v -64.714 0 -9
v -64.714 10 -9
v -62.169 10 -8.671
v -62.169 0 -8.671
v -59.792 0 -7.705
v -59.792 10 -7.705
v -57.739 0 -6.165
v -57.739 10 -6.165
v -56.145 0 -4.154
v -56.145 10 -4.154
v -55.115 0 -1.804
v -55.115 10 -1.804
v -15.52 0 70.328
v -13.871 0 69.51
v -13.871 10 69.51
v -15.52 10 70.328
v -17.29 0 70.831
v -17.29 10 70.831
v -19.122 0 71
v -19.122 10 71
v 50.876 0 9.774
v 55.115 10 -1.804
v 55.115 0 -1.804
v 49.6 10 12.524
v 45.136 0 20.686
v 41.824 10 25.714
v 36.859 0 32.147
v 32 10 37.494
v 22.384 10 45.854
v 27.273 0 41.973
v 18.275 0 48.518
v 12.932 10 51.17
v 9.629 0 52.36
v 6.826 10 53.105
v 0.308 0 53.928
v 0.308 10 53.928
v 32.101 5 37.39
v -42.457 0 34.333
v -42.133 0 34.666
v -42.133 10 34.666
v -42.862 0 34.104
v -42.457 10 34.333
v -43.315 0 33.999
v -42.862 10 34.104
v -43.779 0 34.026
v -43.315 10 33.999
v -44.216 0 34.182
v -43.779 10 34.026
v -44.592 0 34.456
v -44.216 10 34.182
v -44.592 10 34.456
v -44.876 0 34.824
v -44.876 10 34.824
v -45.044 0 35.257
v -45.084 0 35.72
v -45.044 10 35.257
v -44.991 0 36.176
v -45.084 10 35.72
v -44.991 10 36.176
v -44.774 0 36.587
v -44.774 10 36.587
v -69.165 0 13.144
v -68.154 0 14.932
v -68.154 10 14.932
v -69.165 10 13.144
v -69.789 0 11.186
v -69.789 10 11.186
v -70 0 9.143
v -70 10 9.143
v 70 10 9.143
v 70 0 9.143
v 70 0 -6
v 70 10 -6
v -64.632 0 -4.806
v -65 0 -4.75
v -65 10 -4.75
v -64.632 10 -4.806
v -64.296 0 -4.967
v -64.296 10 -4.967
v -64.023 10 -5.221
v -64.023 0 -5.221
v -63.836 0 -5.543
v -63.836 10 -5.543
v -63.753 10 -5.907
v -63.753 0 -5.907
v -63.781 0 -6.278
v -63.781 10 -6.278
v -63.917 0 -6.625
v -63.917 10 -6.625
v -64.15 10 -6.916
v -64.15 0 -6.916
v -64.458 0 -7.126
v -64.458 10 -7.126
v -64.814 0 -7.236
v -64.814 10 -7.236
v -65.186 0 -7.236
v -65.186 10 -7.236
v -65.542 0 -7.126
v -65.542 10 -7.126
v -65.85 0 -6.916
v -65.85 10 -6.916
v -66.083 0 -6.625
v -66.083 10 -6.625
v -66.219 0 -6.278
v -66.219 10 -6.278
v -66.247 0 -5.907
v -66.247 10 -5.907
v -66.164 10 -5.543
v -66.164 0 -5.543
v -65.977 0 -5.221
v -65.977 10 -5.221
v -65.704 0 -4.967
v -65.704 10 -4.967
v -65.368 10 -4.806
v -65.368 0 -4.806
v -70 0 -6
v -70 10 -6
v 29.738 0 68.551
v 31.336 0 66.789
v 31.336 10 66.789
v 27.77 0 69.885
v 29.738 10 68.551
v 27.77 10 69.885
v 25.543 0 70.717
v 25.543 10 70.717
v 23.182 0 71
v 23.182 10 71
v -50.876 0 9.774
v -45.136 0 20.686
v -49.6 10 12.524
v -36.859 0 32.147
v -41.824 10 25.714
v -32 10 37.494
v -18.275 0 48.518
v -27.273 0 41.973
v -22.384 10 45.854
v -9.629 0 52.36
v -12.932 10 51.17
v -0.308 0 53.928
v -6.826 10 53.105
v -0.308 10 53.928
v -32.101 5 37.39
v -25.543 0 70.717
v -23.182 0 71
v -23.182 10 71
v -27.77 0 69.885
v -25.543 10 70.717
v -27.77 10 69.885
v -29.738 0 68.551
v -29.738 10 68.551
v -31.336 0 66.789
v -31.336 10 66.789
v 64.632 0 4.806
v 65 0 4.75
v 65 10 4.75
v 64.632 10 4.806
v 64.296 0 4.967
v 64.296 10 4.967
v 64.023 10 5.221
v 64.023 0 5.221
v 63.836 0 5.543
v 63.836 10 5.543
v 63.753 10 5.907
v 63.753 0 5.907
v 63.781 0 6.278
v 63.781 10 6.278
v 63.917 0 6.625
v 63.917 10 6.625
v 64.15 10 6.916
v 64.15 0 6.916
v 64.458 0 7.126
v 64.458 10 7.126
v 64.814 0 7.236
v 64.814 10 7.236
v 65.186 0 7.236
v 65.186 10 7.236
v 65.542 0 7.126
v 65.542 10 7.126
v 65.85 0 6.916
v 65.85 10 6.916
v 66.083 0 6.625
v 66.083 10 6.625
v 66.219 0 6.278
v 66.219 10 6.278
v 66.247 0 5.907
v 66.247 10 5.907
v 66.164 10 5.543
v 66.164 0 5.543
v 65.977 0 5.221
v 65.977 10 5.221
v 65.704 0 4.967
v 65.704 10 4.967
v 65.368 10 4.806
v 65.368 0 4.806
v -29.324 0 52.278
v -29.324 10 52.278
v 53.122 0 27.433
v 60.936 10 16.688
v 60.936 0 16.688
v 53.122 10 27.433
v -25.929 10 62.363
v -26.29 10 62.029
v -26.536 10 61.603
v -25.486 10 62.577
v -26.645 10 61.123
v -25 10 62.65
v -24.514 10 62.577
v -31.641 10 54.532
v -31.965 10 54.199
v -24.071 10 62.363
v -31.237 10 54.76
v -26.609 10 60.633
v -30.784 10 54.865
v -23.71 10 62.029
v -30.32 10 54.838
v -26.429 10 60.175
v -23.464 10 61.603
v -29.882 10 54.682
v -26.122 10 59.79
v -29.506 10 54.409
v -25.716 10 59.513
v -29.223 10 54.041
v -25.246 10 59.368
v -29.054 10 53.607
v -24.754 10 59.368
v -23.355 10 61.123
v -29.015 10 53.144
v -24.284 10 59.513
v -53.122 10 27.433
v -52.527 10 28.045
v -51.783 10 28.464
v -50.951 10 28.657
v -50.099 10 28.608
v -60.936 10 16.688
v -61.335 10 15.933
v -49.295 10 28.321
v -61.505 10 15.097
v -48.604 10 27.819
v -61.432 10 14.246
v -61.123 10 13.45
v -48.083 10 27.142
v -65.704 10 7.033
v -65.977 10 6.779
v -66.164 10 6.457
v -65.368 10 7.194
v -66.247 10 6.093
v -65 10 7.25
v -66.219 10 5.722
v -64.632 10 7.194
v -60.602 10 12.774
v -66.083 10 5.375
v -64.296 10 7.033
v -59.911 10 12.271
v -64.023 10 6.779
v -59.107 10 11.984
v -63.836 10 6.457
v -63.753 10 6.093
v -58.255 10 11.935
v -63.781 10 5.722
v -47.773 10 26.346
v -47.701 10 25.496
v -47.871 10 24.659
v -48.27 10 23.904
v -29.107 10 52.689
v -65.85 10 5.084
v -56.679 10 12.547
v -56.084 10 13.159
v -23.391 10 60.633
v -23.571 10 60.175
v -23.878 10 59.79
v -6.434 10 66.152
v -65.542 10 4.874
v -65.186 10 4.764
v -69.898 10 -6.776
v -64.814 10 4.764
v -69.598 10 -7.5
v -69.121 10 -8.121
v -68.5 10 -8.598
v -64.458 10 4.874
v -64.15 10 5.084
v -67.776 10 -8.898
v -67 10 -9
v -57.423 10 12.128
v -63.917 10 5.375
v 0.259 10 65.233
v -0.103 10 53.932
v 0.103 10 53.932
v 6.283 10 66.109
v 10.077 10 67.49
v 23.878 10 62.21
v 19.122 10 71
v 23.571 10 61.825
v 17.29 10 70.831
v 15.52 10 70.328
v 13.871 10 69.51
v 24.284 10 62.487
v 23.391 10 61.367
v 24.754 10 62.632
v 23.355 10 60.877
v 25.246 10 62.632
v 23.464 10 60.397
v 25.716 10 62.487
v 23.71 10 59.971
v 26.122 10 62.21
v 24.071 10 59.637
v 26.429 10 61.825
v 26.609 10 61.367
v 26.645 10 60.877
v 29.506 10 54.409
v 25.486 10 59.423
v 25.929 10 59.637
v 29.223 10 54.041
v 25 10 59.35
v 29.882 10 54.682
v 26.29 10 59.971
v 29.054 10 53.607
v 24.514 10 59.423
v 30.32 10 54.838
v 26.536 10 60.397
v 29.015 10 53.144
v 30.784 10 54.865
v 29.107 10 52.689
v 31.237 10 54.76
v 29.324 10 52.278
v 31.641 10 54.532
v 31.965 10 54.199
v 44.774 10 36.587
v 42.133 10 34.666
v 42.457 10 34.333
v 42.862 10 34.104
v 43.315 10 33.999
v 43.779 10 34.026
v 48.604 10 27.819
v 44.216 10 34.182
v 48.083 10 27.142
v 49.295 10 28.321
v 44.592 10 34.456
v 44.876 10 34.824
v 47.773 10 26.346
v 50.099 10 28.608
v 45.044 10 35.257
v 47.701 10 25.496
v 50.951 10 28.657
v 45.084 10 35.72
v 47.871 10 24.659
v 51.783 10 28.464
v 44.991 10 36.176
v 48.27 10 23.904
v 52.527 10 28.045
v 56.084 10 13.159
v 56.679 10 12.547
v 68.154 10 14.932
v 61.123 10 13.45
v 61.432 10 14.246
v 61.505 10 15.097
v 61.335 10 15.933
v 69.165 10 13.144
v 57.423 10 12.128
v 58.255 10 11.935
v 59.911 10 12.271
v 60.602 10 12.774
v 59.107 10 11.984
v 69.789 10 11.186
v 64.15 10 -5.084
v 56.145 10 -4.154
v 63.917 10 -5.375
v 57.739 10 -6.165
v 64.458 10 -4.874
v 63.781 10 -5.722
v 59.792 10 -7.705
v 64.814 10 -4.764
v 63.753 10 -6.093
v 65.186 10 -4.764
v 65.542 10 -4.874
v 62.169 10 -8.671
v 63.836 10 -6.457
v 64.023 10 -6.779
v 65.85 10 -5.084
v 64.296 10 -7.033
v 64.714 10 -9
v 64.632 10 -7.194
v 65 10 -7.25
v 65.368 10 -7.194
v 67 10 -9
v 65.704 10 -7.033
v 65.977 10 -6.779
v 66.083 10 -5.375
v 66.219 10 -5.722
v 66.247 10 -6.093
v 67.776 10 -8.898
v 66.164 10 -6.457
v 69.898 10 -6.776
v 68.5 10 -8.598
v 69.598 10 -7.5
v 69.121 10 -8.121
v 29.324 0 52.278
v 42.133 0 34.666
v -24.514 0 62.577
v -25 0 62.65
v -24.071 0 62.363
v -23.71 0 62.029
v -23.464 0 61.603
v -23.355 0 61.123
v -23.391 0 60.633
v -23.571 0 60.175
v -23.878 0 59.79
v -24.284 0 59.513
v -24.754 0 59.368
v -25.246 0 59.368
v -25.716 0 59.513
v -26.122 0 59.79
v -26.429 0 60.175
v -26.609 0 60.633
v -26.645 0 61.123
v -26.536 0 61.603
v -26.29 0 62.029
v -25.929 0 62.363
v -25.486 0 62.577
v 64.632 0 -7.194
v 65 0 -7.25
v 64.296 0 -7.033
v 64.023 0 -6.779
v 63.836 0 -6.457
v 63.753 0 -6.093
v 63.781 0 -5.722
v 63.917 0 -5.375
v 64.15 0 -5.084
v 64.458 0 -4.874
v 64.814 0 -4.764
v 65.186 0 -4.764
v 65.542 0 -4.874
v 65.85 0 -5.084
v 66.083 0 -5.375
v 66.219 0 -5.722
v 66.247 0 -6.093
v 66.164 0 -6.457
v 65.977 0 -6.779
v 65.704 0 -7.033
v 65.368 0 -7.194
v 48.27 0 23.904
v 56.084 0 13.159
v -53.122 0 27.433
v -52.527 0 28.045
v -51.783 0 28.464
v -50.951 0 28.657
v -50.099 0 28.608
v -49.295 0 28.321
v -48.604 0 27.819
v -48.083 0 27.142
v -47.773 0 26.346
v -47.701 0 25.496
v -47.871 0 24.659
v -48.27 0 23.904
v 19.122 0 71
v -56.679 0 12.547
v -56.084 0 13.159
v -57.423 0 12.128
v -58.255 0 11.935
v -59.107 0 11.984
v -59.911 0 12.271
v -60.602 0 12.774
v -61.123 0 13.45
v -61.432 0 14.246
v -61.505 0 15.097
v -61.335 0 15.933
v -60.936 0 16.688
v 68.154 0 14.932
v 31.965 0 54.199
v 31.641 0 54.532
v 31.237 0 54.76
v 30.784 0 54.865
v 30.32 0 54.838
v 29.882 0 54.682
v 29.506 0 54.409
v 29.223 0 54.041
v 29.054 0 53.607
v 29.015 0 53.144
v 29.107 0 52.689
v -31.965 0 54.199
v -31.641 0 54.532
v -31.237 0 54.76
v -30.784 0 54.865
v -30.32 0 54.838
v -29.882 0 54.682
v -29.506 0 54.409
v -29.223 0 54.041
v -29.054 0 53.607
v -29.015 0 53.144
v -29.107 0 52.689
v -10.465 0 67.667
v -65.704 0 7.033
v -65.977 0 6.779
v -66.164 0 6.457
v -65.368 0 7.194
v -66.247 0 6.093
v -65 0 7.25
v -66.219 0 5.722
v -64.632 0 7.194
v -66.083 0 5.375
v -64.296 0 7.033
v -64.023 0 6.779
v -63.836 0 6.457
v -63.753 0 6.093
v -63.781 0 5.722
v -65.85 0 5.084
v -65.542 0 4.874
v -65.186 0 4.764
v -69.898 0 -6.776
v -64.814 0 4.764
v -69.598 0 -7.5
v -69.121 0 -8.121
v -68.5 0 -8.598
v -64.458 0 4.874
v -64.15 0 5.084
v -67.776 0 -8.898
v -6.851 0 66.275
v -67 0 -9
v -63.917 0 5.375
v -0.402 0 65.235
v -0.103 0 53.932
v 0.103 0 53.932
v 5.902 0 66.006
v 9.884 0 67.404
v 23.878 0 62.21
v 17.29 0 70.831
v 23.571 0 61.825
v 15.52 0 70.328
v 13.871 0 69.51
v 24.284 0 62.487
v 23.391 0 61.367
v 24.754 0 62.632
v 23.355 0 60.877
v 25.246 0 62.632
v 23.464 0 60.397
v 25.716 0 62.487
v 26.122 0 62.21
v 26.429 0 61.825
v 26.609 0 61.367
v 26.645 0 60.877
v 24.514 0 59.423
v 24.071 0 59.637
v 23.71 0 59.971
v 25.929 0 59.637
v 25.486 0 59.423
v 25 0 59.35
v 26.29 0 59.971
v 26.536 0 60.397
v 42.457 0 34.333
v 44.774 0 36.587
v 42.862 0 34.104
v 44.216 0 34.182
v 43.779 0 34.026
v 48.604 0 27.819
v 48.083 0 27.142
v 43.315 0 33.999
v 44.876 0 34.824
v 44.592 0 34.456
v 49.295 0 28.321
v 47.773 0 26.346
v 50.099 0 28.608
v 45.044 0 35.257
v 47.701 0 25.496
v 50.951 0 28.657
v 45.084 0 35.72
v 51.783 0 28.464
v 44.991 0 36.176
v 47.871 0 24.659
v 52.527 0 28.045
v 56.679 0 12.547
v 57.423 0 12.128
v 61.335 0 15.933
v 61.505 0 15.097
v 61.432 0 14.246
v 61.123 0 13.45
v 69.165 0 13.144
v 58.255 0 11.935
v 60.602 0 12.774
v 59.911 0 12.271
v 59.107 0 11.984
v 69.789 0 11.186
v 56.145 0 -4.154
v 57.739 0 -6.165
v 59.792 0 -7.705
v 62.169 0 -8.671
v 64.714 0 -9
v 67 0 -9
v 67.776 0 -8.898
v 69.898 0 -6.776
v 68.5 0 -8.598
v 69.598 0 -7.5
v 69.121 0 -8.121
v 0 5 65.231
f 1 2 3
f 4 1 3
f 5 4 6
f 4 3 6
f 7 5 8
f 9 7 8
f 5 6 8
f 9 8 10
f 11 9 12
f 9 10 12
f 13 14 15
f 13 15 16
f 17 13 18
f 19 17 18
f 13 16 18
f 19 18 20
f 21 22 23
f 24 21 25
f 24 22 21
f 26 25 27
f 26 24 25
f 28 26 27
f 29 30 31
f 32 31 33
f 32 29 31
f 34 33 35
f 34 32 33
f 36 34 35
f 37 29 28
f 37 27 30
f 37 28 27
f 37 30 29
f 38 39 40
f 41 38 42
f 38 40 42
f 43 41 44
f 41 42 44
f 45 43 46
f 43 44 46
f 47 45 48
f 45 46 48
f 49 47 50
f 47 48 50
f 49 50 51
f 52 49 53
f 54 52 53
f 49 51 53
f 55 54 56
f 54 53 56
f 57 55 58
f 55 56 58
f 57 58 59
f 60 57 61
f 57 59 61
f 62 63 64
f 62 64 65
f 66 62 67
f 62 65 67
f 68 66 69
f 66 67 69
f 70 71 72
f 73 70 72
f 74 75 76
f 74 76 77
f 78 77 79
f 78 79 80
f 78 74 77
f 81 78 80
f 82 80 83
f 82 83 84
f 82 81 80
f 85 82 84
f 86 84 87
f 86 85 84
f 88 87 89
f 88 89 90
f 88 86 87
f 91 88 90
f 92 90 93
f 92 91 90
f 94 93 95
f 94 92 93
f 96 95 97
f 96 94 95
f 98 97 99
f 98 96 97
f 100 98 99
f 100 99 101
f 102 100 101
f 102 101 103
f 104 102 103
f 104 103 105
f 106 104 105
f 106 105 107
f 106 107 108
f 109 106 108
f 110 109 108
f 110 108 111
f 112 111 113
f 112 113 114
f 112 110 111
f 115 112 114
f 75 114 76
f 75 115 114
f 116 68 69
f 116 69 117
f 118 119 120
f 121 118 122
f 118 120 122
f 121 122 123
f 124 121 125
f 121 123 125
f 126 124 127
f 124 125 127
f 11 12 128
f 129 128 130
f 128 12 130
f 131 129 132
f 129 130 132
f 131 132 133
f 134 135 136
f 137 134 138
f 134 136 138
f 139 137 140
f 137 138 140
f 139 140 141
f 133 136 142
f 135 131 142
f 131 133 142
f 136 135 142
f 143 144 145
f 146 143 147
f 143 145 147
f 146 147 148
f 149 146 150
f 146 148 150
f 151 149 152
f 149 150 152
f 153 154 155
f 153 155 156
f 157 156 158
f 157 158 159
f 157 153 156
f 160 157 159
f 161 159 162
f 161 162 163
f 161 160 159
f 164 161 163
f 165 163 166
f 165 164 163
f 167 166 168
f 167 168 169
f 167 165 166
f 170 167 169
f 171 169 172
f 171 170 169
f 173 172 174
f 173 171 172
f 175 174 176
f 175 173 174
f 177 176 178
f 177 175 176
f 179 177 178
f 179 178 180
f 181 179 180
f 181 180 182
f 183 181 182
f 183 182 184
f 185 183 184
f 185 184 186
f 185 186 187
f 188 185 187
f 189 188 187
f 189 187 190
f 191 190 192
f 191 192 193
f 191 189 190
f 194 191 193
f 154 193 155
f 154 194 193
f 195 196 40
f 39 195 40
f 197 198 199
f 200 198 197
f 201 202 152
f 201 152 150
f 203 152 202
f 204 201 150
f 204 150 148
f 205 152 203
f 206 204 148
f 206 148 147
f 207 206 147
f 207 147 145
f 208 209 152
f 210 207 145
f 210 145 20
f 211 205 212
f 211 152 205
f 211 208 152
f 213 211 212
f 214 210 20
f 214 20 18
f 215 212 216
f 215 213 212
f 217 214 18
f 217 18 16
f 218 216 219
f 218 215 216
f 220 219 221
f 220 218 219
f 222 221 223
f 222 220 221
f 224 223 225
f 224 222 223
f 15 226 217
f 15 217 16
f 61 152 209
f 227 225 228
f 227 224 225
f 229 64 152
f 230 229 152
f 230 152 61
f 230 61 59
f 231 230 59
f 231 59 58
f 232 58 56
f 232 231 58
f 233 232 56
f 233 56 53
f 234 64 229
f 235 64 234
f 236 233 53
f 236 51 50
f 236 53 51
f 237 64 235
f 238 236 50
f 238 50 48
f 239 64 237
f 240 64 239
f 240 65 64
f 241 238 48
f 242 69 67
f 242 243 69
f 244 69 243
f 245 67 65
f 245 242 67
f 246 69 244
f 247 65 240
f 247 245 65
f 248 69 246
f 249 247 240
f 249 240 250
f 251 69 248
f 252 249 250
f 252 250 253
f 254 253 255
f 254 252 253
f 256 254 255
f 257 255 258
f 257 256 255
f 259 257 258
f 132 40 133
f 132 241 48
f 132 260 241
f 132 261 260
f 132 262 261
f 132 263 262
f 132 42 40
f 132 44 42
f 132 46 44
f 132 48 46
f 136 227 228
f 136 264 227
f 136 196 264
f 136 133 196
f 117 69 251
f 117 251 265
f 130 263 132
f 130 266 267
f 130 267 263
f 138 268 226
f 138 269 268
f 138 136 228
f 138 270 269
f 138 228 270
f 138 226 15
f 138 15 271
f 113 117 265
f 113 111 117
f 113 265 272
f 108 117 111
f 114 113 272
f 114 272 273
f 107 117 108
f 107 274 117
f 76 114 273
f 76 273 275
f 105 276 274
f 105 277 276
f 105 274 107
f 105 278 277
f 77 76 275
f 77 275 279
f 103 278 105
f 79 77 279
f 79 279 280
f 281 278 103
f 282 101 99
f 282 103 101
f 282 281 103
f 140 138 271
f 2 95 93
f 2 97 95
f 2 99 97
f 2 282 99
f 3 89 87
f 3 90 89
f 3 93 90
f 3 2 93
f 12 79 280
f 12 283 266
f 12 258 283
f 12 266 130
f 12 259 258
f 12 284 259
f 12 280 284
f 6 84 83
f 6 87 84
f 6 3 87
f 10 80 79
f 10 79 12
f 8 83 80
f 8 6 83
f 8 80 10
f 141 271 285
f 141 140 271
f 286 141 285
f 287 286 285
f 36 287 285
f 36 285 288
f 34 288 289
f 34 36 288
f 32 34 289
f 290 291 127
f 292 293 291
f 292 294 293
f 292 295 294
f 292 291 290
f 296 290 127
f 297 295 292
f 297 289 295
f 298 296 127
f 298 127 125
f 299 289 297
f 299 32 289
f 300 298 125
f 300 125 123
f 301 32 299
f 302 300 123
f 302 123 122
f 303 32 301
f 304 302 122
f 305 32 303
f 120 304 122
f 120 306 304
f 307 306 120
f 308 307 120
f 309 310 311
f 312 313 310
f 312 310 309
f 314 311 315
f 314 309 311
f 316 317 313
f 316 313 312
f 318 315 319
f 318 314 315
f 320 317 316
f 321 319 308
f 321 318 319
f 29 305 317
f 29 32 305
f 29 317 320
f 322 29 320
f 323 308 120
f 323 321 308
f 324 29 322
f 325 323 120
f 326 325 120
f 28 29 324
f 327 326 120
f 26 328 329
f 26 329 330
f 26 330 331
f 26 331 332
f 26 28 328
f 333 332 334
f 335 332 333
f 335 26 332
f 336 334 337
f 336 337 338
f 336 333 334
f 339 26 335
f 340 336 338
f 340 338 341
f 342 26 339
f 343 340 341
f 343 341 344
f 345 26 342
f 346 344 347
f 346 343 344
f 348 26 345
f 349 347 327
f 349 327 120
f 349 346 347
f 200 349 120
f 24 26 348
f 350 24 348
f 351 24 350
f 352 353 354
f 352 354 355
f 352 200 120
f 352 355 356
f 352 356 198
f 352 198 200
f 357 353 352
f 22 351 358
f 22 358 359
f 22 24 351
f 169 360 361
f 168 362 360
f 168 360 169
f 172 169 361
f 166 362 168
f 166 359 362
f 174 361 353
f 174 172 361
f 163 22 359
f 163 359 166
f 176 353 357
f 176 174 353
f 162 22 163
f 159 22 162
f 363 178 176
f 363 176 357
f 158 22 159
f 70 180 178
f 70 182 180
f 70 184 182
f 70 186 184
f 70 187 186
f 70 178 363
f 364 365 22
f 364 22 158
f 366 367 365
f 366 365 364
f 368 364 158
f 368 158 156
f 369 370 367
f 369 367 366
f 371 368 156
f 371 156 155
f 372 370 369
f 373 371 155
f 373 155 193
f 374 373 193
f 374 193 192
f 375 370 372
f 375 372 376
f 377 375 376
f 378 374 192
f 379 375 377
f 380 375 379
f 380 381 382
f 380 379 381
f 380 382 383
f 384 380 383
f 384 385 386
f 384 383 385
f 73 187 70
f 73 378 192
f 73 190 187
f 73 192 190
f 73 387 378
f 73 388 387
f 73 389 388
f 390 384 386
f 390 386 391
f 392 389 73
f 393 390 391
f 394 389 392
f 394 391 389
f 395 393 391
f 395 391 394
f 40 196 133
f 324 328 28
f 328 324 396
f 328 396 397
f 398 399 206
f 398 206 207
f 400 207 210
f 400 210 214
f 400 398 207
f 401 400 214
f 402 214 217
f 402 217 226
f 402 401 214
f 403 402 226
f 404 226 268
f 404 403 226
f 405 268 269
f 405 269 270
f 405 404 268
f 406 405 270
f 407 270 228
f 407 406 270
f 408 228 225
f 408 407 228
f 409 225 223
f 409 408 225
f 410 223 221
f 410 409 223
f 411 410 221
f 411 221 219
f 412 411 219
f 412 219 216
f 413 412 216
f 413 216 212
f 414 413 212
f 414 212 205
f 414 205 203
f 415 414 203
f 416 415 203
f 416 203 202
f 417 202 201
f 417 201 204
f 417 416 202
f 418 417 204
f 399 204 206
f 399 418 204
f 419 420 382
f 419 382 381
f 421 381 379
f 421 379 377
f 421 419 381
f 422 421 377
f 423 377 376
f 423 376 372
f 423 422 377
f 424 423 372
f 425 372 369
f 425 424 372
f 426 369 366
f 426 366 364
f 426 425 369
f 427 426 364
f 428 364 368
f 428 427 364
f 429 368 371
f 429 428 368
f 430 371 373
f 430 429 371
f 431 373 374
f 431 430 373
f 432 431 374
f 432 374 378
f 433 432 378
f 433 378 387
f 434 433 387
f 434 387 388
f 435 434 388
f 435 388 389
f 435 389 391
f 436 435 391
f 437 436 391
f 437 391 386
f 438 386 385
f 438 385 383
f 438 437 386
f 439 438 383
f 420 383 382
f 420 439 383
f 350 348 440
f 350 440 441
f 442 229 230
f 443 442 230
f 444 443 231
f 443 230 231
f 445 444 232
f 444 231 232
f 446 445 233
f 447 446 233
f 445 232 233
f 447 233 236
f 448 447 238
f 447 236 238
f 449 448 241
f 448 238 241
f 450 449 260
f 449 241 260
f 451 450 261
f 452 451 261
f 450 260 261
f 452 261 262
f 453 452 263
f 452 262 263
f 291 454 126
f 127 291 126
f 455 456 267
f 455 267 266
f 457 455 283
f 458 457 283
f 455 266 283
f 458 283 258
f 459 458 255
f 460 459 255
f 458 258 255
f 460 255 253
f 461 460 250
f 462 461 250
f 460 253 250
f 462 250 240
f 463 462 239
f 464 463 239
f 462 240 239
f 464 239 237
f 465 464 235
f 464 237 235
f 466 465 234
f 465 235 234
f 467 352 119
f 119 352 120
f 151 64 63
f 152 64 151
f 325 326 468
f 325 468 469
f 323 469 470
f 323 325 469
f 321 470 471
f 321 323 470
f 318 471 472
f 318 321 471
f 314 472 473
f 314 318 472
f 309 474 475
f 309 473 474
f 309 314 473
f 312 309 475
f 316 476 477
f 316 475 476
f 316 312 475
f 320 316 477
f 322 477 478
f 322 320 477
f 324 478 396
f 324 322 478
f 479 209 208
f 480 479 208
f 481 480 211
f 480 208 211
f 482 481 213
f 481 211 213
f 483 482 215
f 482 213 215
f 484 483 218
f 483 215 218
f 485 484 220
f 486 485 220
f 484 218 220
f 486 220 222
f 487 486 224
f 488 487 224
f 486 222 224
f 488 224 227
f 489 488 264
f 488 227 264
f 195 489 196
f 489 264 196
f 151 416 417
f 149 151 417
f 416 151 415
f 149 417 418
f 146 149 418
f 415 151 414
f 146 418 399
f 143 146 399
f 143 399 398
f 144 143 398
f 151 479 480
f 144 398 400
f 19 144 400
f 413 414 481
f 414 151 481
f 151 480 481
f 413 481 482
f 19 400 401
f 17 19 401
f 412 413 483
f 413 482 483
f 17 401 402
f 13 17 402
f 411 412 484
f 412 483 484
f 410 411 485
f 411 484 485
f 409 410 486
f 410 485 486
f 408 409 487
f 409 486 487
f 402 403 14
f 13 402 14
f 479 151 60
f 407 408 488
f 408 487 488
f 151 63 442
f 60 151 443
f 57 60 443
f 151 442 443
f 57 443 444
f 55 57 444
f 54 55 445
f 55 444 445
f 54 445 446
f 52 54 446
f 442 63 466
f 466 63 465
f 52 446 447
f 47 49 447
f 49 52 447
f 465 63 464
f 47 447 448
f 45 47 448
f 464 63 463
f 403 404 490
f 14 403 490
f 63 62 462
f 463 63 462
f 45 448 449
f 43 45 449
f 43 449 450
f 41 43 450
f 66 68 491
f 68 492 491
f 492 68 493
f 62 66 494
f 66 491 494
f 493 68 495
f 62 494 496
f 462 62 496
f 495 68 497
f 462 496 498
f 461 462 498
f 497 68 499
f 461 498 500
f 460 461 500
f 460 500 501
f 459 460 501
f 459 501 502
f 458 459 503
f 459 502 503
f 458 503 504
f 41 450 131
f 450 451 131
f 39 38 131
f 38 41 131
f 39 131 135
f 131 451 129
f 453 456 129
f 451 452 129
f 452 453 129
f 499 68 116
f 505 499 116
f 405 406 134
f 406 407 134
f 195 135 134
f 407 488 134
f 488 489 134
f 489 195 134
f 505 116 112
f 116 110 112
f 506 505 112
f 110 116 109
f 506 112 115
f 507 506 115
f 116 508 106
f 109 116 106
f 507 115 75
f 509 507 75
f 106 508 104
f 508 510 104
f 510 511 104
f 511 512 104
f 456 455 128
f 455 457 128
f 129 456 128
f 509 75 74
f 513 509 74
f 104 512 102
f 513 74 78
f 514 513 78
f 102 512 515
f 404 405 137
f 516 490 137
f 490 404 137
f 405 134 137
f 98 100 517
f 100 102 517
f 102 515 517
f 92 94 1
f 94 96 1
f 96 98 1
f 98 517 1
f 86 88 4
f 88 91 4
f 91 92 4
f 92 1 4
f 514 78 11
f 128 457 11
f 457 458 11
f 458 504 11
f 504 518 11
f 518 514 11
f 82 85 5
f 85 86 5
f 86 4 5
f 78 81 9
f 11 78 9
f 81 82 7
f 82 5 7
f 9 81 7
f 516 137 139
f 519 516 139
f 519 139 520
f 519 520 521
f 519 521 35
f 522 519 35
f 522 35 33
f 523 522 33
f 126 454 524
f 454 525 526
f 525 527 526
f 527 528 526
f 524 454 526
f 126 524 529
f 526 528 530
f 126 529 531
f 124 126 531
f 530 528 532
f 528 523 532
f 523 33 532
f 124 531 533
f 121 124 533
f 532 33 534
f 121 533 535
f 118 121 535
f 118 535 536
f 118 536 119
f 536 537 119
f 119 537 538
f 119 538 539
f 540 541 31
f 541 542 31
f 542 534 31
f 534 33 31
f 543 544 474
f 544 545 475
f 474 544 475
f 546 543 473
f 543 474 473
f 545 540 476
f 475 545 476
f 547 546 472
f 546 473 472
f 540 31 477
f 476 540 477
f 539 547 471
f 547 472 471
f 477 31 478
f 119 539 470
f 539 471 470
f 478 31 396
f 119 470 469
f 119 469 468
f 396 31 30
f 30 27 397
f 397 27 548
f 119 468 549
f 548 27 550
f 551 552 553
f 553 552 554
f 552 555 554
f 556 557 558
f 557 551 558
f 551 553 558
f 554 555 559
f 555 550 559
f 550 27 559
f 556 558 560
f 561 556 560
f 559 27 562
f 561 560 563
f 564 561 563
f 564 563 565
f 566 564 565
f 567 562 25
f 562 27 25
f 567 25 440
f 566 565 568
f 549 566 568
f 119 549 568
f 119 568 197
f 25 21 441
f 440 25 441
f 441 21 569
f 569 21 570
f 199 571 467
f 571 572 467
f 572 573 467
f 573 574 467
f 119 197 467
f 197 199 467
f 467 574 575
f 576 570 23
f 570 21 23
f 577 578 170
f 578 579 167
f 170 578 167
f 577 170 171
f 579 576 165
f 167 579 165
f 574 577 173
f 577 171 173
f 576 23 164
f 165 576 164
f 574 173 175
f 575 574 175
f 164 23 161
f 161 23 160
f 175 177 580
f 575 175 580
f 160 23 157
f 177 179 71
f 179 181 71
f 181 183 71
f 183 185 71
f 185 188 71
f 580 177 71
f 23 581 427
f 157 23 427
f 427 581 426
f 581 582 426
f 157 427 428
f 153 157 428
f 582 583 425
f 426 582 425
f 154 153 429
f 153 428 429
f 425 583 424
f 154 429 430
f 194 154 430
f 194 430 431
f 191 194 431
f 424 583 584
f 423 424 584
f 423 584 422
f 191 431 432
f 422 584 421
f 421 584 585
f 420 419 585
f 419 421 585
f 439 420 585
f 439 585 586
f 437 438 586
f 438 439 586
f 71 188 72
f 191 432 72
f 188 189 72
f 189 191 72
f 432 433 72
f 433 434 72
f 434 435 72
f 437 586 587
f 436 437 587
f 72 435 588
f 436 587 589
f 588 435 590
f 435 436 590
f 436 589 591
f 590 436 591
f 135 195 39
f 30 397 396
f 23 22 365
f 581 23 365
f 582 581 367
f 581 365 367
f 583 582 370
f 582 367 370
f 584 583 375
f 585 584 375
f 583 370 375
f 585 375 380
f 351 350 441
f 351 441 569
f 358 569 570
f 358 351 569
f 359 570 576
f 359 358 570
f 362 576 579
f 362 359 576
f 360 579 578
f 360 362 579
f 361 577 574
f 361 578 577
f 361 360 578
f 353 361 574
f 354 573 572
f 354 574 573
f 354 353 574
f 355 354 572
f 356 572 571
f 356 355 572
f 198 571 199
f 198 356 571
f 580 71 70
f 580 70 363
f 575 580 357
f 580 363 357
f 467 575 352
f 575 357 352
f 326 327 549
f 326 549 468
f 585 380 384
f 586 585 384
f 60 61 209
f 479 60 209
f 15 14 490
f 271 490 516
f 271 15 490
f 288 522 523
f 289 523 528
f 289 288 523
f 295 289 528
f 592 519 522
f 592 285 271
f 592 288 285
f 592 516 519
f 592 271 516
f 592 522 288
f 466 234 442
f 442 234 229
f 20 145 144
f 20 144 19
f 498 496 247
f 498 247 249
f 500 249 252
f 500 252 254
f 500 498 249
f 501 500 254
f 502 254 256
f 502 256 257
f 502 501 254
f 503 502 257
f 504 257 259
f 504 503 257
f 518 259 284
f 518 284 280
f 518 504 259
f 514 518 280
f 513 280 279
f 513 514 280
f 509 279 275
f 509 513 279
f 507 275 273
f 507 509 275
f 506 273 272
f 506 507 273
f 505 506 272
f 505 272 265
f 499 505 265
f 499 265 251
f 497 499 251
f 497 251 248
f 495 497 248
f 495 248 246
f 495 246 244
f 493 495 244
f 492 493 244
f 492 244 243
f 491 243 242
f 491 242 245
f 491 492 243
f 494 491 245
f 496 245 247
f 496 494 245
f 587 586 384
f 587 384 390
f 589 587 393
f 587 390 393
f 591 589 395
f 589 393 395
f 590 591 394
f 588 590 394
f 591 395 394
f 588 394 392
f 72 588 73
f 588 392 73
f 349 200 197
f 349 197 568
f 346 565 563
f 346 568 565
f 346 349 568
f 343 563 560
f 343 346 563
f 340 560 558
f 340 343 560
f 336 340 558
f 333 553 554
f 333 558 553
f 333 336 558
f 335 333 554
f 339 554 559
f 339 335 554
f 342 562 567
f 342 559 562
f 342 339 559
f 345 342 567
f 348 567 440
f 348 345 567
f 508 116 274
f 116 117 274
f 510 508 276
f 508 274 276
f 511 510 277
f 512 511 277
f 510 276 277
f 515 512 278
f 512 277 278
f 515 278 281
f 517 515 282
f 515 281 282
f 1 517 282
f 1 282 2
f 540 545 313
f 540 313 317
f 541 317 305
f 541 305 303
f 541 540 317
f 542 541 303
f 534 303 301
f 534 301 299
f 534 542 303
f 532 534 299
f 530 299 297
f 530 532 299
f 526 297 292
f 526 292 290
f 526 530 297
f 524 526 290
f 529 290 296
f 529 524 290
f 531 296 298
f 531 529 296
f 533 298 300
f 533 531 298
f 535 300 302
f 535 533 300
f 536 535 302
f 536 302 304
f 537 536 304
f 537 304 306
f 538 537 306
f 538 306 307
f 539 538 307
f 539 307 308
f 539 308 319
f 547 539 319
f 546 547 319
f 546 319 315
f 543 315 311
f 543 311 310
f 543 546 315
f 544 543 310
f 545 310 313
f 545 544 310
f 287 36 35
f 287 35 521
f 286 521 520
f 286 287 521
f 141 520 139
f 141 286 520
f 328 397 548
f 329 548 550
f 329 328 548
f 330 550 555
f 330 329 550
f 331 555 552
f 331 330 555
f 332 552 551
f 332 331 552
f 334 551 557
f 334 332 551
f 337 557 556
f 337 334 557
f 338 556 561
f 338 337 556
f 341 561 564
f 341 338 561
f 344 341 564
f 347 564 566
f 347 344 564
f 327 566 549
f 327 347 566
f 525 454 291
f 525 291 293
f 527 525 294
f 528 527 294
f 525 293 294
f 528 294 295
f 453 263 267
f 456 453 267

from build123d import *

# Parameters (mm, degrees)
SKETCH_1_W          = 140
SKETCH_1_H          = 80
SKETCH_1_R          = 1.25
SKETCH_1_R_2        = 1.65
EXTRUDE_1_DEPTH     = 10
CUT_EXTRUDE_1_DEPTH = 101.204790305
FILLET_1_R          = 10
FILLET_2_R          = 3
CUT_EXTRUDE_2_DEPTH = 101.204790455


with BuildPart() as part:
    # 草图1 → 凸台-拉伸1 (new body)
    with BuildSketch(Plane(origin=(0, 0, 0), x_dir=(1, 0, 0), z_dir=(0, 1, 0))):
        with Locations((0, -31)):
            Rectangle(SKETCH_1_W, SKETCH_1_H)
        with Locations(Location((-65, 6, 0), (0, 0, 270))):
            Circle(SKETCH_1_R, mode=Mode.SUBTRACT)
        with Locations(Location((-65, -6, 0), (0, 0, 270))):
            Circle(SKETCH_1_R, mode=Mode.SUBTRACT)
        with Locations(Location((65, -6, 0), (0, 0, 90))):
            Circle(SKETCH_1_R, mode=Mode.SUBTRACT)
        with Locations(Location((65, 6, 0), (0, 0, 90))):
            Circle(SKETCH_1_R, mode=Mode.SUBTRACT)
        with Locations(Location((-25, -61, 0), (0, 0, 270))):
            Circle(SKETCH_1_R_2, mode=Mode.SUBTRACT)
        with Locations(Location((25, -61, 0), (0, 0, 90))):
            Circle(SKETCH_1_R_2, mode=Mode.SUBTRACT)
    extrude(amount=EXTRUDE_1_DEPTH)

    # 草图2 → 切除-拉伸1 (cut, through all)
    with BuildSketch(Plane(origin=(0, 10, 0), x_dir=(1, 0, 0), z_dir=(0, 1, 0))):
        Polygon((-70, -12.331865366), (-28.346020761, -71), (-70, -71), align=None)
        Polygon((70, -12.331865366), (28.346020761, -71), (70, -71), align=None)
        with BuildLine():
            Line((-16.105693614, -71), (16.105693614, -71))
            add(Edge.make_bspline(
                [(-16.105693614, -71), (0, -59.46206609), (16.105693614, -71)],
                knots=[0, 0, 0, 1, 1, 1], degree=2))
        make_face()
        with BuildLine():
            Line((56.906784104, 9), (-56.906784104, 9))
            add(Edge.make_bspline(
                [(-56.906784104, 9), (-53.268076424, -8.599244087), (-38.630052836, -35.640481439), (-12.875691634, -53.653343186), (0, -53.936278292)],
                knots=[0, 0, 0, 0, 0.590583246, 1, 1, 1, 1], degree=3))
            add(Edge.make_bspline(
                [(56.906784104, 9), (53.268076424, -8.599244087), (38.630052836, -35.640481439), (12.875691634, -53.653343186), (0, -53.936278292)],
                knots=[0, 0, 0, 0, 0.590583246, 1, 1, 1, 1], degree=3))
        make_face()
    extrude(amount=-CUT_EXTRUDE_1_DEPTH, mode=Mode.SUBTRACT)

    # 圆角1
    # the kernel refuses this fillet: 10 mm, written as the material it adds along each edge
    with BuildSketch(Plane(origin=(0, 10, 53.936278292), x_dir=(-0.999651568741567, 0, -0.026395854078324985), z_dir=(0, -1, 0))) as fillet_1_piece_1:
        with BuildLine():
            CenterArc((0.264047953, 9.999901848), FILLET_1_R, 266.721049901, 3.532806773)
            Line((-0.307924469, 0.016272871), (-0.319363918, -0.183399709))
            ThreePointArc((-0.319363918, -0.183399709), (-0.16453479, -0.191925855), (-0.009670177, -0.199766082))
            Line((-0.009670177, -0.199766082), (-0.000885616, -0.199998039))
            ThreePointArc((-0.000885616, -0.199998039), (0.15417695, -0.200341456), (0.30924028, -0.199998037))
            Line((0.30924028, -0.199998037), (0.308354155, 0))
        make_face()
    extrude(amount=10)
    # the kernel refuses this fillet: 10 mm, written as the material it takes off along each edge
    with BuildSketch(Plane(origin=(-70, 10, 12.331865366), x_dir=(0.5789182566890616, 0, 0.8153855849057535), z_dir=(0, -1, 0)), Plane(origin=(70, 10, 12.331865366), x_dir=(0, 0, -1), z_dir=(0, -1, 0))) as fillet_1_2_piece_1:
        with BuildLine():
            CenterArc((FILLET_1_R * 0.318895479562, -FILLET_1_R), FILLET_1_R, 90, 35.374494493)
            Line((-FILLET_1_R * 0.260022777127, -FILLET_1_R * 0.184614415094), (-FILLET_1_R * 0.271601142261, -FILLET_1_R * 0.168306703396))
            Line((-FILLET_1_R * 0.271601142261, -FILLET_1_R * 0.168306703396), (-FILLET_1_R * 0.00637790959125, FILLET_1_R * 0.02))
            Line((-FILLET_1_R * 0.00637790959125, FILLET_1_R * 0.02), (FILLET_1_R * 0.318895479562, FILLET_1_R * 0.02))
            Line((FILLET_1_R * 0.318895479562, FILLET_1_R * 0.02), (FILLET_1_R * 0.318895479562, 0))
        make_face()
    extrude(amount=10, mode=Mode.SUBTRACT)
    with BuildSketch(Plane(origin=(-56.906784104, 10, -9), x_dir=(-1, 0, 0), z_dir=(0, -1, 0))) as fillet_1_2_piece_2:
        with BuildLine():
            CenterArc((7.807317394, -10), FILLET_1_R, 90, 73.718330192)
            Line((-1.79163295, -7.196403685), (-1.983611957, -7.140331758))
            ThreePointArc((-1.983611957, -7.140331758), (-1.017653275, -3.56787057), (-0.195857636, 0.040494278))
            Line((-0.195857636, 0.040494278), (0, 0.2))
            Line((0, 0.2), (7.807317394, 0.2))
            Line((7.807317394, 0.2), (7.807317394, 0))
        make_face()
    extrude(amount=10, mode=Mode.SUBTRACT)
    with BuildSketch(Plane(origin=(56.906784104, 10, -9), x_dir=(-0.2415877467248244, 0, 0.9703789778392884), z_dir=(0, -1, 0))) as fillet_1_2_piece_3:
        with BuildLine():
            CenterArc((7.817637561, -9.991934139), FILLET_1_R, 92.301400389, 73.718330192)
            Line((-1.886152217, -7.576056672), (-2.080228013, -7.527739123))
            Line((-2.080228013, -7.527739123), (-0.194075796, 0.048317549))
            Line((-0.194075796, 0.048317549), (0.008022009, 0.199839054))
            ThreePointArc((0.008022009, 0.199839054), (3.708039158, 0.125555533), (7.408044176, 0.199838683))
            Line((7.408044176, 0.199838683), (7.416075419, 0))
        make_face()
    extrude(amount=10, mode=Mode.SUBTRACT)
    with BuildSketch(Plane(origin=(-28.346020761, 10, 71), x_dir=(1, 0, 0), z_dir=(0, -1, 0)), Plane(origin=(28.346020761, 10, 71), x_dir=(0.5789182566890612, 0, -0.8153855849057537), z_dir=(0, -1, 0))) as fillet_1_2_piece_4:
        with BuildLine():
            CenterArc((FILLET_1_R * 0.516420391905, -FILLET_1_R), FILLET_1_R, 90, 54.625505507)
            Line((-FILLET_1_R * 0.298965193, -FILLET_1_R * 0.421081743311), (-FILLET_1_R * 0.315272904699, -FILLET_1_R * 0.409503378177))
            Line((-FILLET_1_R * 0.315272904699, -FILLET_1_R * 0.409503378177), (-FILLET_1_R * 0.0103284078381, FILLET_1_R * 0.02))
            Line((-FILLET_1_R * 0.0103284078381, FILLET_1_R * 0.02), (FILLET_1_R * 0.516420391905, FILLET_1_R * 0.02))
            Line((FILLET_1_R * 0.516420391905, FILLET_1_R * 0.02), (FILLET_1_R * 0.516420391905, 0))
        make_face()
    extrude(amount=10, mode=Mode.SUBTRACT)
    with BuildSketch(Plane(origin=(-16.105693614, 10, 71), x_dir=(-1, 0, 0), z_dir=(0, -1, 0))) as fillet_1_2_piece_5:
        with BuildLine():
            CenterArc((3.016711089, 10), FILLET_1_R, 238.325124011, 31.674875989)
            Line((-2.234274138, 1.489585548), (-2.339293843, 1.319377259))
            ThreePointArc((-2.339293843, 1.319377259), (-1.215329893, 0.597636236), (-0.116473908, -0.162584835))
            Line((-0.116473908, -0.162584835), (0, -0.2))
            Line((0, -0.2), (3.016711089, -0.2))
            Line((3.016711089, -0.2), (3.016711089, 0))
        make_face()
    extrude(amount=10, mode=Mode.SUBTRACT)
    with BuildSketch(Plane(origin=(16.105693614, 10, 71), x_dir=(-0.8320383563974485, 0, -0.554718102718338), z_dir=(0, -1, 0))) as fillet_1_2_piece_6:
        with BuildLine():
            CenterArc((3.037161691, 9.993807815), FILLET_1_R, 236.308699407, 31.674875989)
            Line((-2.510019336, 1.673424251), (-2.620962956, 1.50701658))
            Line((-2.620962956, 1.50701658), (-0.110943621, -0.166407671))
            Line((-0.110943621, -0.166407671), (0.006722008, -0.199887005))
            ThreePointArc((0.006722008, -0.199887005), (1.342720726, -0.176909221), (2.678264654, -0.199876156))
            Line((2.678264654, -0.199876156), (2.685301851, 0))
        make_face()
    extrude(amount=10, mode=Mode.SUBTRACT)

    # 圆角2
    fillet_2_edges = [part.edges().sort_by_distance(p)[0] for p in [
        (-70, 5, -9),
        (70, 5, -9),
    ]]
    fillet(fillet_2_edges, radius=FILLET_2_R)

    # 草图3 → 切除-拉伸2 (cut, through all)
    with BuildSketch(Plane(origin=(0, 10, 0), x_dir=(1, 0, 0), z_dir=(0, 1, 0))):
        with BuildLine():
            Line((29.324357242, -52.277909179), (42.133187381, -34.665767738))
            ThreePointArc((42.133187381, -34.665767738), (44.414090847, -34.305625086), (44.774233499, -36.586528552))
            Line((44.774233499, -36.586528552), (31.965403361, -54.198669993))
            ThreePointArc((31.965403361, -54.198669993), (29.684499894, -54.558812645), (29.324357242, -52.277909179))
        make_face()
        with BuildLine():
            Line((60.93603818, -16.688498943), (53.122046102, -27.432738051))
            ThreePointArc((53.122046102, -27.432738051), (48.931322756, -28.09443121), (48.269629596, -23.903707865))
            Line((48.269629596, -23.903707865), (56.083621674, -13.159468757))
            ThreePointArc((56.083621674, -13.159468757), (60.27434502, -12.497775597), (60.93603818, -16.688498943))
        make_face()
        with BuildLine():
            Line((-60.93603818, -16.688498943), (-53.122046102, -27.432738051))
            ThreePointArc((-53.122046102, -27.432738051), (-48.931322756, -28.09443121), (-48.269629596, -23.903707865))
            Line((-48.269629596, -23.903707865), (-56.083621674, -13.159468757))
            ThreePointArc((-56.083621674, -13.159468757), (-60.27434502, -12.497775597), (-60.93603818, -16.688498943))
        make_face()
        with BuildLine():
            Line((-29.324357242, -52.277909179), (-42.133187381, -34.665767738))
            ThreePointArc((-42.133187381, -34.665767738), (-44.414090847, -34.305625086), (-44.774233499, -36.586528552))
            Line((-44.774233499, -36.586528552), (-31.965403361, -54.198669993))
            ThreePointArc((-31.965403361, -54.198669993), (-29.684499894, -54.558812645), (-29.324357242, -52.277909179))
        make_face()
    extrude(amount=-CUT_EXTRUDE_2_DEPTH, mode=Mode.SUBTRACT)


solid = part.part
